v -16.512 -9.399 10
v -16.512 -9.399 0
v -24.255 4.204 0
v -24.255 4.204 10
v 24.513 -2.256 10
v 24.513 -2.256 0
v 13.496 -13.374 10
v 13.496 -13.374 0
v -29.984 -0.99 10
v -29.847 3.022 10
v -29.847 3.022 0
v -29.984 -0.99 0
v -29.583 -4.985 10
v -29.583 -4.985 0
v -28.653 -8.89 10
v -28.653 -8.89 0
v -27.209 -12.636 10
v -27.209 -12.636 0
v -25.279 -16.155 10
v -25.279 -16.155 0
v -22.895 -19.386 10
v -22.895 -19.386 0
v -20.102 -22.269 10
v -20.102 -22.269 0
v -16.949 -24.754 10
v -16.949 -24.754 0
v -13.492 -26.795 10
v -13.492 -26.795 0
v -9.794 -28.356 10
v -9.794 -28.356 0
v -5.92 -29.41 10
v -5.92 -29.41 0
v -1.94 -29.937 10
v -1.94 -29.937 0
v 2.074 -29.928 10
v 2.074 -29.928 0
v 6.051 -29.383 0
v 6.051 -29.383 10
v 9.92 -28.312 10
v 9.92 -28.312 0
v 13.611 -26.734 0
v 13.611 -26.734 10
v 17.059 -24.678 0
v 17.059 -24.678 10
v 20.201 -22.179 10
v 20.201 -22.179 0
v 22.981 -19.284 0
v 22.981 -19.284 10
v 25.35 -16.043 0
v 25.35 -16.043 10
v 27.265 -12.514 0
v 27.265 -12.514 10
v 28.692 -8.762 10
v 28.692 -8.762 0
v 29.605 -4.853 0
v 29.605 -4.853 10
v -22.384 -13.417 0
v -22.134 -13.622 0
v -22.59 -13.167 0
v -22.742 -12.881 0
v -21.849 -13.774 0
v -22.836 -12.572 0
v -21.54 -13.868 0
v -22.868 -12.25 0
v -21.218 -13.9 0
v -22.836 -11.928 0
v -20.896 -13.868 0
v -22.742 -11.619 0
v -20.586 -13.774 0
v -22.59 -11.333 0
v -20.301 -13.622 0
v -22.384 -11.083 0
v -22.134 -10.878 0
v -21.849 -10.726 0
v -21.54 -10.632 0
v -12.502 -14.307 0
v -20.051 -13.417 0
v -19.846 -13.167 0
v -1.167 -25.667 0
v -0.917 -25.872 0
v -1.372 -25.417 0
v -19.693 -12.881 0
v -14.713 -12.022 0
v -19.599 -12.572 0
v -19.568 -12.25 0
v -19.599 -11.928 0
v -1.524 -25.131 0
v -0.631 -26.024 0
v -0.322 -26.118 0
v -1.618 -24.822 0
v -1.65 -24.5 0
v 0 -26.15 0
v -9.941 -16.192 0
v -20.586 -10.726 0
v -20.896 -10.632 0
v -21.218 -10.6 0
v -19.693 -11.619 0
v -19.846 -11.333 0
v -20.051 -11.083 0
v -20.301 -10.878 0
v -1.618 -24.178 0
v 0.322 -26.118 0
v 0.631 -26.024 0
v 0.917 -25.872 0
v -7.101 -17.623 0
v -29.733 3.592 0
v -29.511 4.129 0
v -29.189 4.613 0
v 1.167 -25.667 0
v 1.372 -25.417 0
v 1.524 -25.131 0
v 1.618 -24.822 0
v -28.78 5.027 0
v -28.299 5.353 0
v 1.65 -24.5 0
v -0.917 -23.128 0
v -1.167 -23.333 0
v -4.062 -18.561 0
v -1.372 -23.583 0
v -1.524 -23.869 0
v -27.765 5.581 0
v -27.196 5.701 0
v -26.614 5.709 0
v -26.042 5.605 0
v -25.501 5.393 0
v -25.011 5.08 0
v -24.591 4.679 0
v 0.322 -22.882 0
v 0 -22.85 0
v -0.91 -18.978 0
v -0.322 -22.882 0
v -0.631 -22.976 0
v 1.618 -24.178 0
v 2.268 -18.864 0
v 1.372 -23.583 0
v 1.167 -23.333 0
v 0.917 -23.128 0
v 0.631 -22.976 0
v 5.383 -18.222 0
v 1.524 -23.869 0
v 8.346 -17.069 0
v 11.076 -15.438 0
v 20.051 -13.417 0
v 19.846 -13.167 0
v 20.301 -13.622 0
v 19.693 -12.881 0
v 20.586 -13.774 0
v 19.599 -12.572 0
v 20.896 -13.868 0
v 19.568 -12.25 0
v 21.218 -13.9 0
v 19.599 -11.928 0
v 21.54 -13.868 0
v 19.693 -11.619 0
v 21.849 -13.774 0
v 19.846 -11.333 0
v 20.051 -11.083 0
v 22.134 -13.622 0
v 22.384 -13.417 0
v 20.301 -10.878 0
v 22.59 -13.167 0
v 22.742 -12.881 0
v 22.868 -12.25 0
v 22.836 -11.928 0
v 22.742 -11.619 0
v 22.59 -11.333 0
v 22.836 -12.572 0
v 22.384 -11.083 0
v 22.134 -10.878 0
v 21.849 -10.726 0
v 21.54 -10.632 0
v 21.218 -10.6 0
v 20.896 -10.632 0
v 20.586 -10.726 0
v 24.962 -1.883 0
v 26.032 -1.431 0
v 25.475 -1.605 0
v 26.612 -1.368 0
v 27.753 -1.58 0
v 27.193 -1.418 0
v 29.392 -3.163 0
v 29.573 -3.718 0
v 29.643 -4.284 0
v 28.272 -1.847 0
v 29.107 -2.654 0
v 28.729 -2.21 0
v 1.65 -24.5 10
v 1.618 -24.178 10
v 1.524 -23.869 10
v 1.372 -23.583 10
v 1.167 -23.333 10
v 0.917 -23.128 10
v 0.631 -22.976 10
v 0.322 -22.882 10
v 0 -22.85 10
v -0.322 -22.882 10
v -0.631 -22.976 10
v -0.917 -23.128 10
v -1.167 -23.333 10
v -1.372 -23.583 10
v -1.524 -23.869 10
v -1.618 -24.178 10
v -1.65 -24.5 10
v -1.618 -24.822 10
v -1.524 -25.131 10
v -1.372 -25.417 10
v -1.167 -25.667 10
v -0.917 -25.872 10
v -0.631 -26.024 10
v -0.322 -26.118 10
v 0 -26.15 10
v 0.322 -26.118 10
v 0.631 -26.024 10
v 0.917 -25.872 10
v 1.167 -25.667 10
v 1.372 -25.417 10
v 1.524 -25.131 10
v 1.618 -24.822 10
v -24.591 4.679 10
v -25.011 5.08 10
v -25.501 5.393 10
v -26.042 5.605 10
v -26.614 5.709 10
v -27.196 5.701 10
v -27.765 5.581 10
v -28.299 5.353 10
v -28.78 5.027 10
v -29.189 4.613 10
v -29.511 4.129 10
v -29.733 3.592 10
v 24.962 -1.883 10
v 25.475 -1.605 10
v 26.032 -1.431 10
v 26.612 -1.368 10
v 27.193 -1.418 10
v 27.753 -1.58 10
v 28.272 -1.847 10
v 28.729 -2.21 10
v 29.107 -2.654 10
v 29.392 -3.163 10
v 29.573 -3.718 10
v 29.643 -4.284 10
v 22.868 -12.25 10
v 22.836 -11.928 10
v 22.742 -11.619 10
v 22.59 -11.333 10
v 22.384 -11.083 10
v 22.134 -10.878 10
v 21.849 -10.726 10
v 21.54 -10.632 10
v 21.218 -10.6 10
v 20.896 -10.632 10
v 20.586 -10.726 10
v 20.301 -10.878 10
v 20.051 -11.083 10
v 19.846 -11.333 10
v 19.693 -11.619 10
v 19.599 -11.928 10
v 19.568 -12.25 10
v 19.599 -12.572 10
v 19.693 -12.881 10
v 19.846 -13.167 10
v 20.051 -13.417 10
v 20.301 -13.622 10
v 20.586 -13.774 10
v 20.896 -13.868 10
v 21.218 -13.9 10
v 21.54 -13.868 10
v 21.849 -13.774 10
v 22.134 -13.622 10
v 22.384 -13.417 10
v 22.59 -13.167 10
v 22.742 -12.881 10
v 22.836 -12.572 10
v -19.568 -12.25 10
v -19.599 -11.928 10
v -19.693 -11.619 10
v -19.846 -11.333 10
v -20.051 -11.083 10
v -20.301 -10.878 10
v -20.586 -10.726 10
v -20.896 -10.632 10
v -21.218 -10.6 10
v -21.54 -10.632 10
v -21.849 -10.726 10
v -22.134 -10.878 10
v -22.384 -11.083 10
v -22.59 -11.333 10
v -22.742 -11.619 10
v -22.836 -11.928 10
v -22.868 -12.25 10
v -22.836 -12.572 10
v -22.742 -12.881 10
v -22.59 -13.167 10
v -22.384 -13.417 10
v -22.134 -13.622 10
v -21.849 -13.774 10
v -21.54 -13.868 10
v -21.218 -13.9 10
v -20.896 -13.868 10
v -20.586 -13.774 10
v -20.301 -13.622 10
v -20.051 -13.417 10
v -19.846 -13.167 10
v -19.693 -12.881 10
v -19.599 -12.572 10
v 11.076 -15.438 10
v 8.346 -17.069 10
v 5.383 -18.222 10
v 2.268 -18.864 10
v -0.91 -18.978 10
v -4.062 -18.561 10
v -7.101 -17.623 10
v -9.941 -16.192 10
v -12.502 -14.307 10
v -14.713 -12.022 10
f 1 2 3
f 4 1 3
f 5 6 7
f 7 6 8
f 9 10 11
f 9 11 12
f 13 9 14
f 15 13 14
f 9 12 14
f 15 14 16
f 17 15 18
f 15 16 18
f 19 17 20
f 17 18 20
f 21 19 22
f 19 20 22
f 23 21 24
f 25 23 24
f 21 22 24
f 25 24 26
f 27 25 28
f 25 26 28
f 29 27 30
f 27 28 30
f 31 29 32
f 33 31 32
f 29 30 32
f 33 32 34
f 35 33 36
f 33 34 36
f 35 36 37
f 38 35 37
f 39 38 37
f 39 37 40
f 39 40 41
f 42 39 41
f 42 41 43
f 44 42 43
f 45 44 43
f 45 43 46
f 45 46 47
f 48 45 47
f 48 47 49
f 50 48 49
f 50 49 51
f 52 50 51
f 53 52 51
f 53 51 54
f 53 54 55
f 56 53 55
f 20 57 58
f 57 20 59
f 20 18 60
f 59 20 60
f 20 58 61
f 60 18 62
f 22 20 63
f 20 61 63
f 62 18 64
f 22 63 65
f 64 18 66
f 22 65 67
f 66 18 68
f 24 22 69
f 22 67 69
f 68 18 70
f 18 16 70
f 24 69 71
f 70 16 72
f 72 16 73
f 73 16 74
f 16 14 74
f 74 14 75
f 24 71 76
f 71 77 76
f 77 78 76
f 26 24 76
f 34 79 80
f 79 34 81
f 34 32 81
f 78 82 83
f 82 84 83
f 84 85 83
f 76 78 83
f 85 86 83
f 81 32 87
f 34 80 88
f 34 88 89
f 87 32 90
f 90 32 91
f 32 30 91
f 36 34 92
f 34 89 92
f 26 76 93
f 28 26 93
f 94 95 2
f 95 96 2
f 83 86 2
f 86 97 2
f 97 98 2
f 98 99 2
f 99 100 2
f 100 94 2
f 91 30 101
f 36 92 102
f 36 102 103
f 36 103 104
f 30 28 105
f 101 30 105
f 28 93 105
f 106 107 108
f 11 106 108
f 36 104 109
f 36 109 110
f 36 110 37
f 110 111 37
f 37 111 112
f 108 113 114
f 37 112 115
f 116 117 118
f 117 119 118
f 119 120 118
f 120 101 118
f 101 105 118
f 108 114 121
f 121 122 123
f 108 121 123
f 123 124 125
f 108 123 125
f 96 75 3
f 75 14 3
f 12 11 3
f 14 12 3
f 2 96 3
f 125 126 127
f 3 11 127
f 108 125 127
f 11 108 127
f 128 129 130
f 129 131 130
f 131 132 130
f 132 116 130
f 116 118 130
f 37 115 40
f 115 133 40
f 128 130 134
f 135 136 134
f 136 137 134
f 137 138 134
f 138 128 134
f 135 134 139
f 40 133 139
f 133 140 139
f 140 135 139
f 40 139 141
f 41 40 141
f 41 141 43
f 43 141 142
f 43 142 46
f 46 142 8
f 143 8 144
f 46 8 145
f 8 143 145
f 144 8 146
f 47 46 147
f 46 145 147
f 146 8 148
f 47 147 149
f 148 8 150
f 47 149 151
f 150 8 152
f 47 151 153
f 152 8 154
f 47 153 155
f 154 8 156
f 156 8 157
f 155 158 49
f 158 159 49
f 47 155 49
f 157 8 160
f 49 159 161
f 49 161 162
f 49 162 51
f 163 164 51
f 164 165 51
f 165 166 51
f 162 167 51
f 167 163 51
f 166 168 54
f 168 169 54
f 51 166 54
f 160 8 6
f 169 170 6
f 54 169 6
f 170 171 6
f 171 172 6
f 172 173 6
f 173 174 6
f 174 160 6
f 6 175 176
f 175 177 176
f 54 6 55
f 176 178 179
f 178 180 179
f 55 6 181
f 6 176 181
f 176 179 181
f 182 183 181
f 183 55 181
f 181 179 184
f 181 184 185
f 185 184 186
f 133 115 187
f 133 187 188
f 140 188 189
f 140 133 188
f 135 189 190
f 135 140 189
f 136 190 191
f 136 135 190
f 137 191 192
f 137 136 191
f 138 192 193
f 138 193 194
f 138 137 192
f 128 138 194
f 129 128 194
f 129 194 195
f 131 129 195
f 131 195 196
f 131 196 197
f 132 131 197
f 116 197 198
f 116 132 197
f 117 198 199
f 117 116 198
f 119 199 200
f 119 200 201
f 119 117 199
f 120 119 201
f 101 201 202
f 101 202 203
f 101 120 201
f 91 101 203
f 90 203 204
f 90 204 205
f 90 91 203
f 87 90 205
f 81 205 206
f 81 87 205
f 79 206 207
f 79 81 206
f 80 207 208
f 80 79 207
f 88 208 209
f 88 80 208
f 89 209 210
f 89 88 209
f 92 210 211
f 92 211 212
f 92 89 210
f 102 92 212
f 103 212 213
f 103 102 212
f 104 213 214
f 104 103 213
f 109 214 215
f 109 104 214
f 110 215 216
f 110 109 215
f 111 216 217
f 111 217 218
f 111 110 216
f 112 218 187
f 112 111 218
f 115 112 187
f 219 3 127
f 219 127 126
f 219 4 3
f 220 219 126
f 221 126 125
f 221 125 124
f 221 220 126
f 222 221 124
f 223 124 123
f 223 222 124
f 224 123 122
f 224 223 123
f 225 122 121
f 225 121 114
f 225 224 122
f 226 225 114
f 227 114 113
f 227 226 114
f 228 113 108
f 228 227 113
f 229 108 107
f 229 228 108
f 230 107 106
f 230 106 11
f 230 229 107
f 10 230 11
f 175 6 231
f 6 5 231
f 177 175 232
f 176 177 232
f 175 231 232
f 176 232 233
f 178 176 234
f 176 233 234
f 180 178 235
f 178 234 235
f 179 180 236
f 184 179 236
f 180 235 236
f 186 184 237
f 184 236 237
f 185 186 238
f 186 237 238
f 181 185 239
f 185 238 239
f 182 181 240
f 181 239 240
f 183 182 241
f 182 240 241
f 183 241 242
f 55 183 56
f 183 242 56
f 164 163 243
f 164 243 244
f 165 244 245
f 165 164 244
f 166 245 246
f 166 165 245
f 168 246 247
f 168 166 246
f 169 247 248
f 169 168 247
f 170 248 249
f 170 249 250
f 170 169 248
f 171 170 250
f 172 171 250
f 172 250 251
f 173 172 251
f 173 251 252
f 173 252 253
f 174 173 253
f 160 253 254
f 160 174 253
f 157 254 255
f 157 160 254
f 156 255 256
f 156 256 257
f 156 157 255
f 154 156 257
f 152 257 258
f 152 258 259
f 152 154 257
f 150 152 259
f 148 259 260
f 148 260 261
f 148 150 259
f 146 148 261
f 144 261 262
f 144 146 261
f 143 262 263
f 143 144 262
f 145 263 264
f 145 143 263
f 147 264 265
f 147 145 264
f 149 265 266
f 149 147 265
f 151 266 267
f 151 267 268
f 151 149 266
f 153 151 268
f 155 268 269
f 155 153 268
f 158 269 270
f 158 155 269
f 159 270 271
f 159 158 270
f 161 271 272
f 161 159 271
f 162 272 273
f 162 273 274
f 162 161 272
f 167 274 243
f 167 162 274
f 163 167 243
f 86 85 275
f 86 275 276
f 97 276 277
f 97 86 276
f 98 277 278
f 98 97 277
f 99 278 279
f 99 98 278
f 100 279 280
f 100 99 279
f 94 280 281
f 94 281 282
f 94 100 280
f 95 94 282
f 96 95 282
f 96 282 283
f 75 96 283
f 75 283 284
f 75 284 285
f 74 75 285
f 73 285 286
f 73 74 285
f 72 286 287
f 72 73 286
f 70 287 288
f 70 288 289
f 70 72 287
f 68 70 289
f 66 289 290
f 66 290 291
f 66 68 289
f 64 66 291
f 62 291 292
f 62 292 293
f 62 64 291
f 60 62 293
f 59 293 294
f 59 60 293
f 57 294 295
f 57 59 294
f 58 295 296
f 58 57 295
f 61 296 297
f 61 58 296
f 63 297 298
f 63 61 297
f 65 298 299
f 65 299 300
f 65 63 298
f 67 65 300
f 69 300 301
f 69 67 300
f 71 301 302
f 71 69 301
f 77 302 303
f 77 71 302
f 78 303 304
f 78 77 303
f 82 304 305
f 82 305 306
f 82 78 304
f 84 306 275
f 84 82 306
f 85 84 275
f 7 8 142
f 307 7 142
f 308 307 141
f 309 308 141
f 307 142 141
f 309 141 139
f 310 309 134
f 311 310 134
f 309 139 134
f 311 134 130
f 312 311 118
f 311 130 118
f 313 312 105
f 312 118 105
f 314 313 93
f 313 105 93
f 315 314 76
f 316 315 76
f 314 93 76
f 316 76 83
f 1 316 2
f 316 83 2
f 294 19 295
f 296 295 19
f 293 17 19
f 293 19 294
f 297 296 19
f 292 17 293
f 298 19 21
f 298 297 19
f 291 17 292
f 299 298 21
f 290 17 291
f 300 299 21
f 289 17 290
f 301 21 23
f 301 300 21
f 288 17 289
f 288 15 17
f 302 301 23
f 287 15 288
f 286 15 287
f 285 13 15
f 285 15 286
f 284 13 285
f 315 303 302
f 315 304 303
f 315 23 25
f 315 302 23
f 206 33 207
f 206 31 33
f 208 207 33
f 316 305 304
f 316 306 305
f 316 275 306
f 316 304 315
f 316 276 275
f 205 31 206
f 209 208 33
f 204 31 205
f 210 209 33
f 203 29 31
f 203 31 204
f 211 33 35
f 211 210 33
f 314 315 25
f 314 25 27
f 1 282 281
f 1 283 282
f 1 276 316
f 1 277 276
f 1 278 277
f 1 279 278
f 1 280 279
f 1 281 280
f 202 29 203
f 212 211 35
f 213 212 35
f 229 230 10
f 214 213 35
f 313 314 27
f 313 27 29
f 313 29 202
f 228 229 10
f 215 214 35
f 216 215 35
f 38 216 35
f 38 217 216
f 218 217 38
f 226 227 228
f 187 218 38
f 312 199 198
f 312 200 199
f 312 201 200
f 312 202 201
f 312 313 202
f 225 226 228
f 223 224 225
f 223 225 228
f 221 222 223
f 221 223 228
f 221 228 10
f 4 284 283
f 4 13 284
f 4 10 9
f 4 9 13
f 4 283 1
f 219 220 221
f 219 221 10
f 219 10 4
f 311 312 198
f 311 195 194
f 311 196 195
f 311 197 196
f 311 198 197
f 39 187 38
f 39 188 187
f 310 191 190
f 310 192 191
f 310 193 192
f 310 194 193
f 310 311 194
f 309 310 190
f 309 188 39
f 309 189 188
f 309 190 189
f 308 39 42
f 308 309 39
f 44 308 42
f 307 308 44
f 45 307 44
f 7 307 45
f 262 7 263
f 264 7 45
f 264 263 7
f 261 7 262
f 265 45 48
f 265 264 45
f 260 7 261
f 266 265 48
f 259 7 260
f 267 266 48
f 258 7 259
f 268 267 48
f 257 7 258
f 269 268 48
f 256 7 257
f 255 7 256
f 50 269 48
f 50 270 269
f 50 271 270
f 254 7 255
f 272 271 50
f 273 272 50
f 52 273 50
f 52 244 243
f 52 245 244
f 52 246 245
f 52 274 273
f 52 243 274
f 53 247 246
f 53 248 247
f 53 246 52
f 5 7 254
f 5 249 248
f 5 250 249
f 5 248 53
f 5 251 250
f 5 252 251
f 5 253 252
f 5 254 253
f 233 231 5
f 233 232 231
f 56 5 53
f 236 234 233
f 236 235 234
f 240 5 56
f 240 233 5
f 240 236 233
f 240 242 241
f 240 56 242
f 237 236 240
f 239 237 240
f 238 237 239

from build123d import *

# Parameters (mm, degrees)
SKETCH_1_R      = 1.65
EXTRUDE_2_DEPTH = 10
FILLET_2_R      = 3


with BuildPart() as part:
    # ｽｹｯﾁ1 → ﾎﾞｽ - 押し出し2 (new body)
    with BuildSketch(Plane.XY):
        with BuildLine():
            ThreePointArc((13.495853088, -13.373927973), (-2.494791786, -18.835498771), (-16.512205084, -9.399312914))
            Line((-16.512205084, -9.399312914), (-27.997360851, 10.777188196))
            ThreePointArc((-27.997360851, 10.777188196), (-5.480838188, -29.495091333), (30, 0))
            ThreePointArc((30, 0), (29.95938456, 1.560537335), (29.837648215, 3.116849208))
            Line((29.837648215, 3.116849208), (13.495853088, -13.373927973))
        make_face()
        with Locations((-21.217622393, -12.25)):
            Circle(SKETCH_1_R, mode=Mode.SUBTRACT)
        with Locations((0, -24.5)):
            Circle(SKETCH_1_R, mode=Mode.SUBTRACT)
        with Locations((21.217622393, -12.25)):
            Circle(SKETCH_1_R, mode=Mode.SUBTRACT)
    extrude(amount=EXTRUDE_2_DEPTH)

    # ﾌｨﾚｯﾄ2
    fillet_2_edges = [part.edges().sort_by_distance(p)[0] for p in [
        (29.837648215, 3.116849208, 5),
        (-27.997360851, 10.777188196, 5),
    ]]
    fillet(fillet_2_edges, radius=FILLET_2_R)


solid = part.part
